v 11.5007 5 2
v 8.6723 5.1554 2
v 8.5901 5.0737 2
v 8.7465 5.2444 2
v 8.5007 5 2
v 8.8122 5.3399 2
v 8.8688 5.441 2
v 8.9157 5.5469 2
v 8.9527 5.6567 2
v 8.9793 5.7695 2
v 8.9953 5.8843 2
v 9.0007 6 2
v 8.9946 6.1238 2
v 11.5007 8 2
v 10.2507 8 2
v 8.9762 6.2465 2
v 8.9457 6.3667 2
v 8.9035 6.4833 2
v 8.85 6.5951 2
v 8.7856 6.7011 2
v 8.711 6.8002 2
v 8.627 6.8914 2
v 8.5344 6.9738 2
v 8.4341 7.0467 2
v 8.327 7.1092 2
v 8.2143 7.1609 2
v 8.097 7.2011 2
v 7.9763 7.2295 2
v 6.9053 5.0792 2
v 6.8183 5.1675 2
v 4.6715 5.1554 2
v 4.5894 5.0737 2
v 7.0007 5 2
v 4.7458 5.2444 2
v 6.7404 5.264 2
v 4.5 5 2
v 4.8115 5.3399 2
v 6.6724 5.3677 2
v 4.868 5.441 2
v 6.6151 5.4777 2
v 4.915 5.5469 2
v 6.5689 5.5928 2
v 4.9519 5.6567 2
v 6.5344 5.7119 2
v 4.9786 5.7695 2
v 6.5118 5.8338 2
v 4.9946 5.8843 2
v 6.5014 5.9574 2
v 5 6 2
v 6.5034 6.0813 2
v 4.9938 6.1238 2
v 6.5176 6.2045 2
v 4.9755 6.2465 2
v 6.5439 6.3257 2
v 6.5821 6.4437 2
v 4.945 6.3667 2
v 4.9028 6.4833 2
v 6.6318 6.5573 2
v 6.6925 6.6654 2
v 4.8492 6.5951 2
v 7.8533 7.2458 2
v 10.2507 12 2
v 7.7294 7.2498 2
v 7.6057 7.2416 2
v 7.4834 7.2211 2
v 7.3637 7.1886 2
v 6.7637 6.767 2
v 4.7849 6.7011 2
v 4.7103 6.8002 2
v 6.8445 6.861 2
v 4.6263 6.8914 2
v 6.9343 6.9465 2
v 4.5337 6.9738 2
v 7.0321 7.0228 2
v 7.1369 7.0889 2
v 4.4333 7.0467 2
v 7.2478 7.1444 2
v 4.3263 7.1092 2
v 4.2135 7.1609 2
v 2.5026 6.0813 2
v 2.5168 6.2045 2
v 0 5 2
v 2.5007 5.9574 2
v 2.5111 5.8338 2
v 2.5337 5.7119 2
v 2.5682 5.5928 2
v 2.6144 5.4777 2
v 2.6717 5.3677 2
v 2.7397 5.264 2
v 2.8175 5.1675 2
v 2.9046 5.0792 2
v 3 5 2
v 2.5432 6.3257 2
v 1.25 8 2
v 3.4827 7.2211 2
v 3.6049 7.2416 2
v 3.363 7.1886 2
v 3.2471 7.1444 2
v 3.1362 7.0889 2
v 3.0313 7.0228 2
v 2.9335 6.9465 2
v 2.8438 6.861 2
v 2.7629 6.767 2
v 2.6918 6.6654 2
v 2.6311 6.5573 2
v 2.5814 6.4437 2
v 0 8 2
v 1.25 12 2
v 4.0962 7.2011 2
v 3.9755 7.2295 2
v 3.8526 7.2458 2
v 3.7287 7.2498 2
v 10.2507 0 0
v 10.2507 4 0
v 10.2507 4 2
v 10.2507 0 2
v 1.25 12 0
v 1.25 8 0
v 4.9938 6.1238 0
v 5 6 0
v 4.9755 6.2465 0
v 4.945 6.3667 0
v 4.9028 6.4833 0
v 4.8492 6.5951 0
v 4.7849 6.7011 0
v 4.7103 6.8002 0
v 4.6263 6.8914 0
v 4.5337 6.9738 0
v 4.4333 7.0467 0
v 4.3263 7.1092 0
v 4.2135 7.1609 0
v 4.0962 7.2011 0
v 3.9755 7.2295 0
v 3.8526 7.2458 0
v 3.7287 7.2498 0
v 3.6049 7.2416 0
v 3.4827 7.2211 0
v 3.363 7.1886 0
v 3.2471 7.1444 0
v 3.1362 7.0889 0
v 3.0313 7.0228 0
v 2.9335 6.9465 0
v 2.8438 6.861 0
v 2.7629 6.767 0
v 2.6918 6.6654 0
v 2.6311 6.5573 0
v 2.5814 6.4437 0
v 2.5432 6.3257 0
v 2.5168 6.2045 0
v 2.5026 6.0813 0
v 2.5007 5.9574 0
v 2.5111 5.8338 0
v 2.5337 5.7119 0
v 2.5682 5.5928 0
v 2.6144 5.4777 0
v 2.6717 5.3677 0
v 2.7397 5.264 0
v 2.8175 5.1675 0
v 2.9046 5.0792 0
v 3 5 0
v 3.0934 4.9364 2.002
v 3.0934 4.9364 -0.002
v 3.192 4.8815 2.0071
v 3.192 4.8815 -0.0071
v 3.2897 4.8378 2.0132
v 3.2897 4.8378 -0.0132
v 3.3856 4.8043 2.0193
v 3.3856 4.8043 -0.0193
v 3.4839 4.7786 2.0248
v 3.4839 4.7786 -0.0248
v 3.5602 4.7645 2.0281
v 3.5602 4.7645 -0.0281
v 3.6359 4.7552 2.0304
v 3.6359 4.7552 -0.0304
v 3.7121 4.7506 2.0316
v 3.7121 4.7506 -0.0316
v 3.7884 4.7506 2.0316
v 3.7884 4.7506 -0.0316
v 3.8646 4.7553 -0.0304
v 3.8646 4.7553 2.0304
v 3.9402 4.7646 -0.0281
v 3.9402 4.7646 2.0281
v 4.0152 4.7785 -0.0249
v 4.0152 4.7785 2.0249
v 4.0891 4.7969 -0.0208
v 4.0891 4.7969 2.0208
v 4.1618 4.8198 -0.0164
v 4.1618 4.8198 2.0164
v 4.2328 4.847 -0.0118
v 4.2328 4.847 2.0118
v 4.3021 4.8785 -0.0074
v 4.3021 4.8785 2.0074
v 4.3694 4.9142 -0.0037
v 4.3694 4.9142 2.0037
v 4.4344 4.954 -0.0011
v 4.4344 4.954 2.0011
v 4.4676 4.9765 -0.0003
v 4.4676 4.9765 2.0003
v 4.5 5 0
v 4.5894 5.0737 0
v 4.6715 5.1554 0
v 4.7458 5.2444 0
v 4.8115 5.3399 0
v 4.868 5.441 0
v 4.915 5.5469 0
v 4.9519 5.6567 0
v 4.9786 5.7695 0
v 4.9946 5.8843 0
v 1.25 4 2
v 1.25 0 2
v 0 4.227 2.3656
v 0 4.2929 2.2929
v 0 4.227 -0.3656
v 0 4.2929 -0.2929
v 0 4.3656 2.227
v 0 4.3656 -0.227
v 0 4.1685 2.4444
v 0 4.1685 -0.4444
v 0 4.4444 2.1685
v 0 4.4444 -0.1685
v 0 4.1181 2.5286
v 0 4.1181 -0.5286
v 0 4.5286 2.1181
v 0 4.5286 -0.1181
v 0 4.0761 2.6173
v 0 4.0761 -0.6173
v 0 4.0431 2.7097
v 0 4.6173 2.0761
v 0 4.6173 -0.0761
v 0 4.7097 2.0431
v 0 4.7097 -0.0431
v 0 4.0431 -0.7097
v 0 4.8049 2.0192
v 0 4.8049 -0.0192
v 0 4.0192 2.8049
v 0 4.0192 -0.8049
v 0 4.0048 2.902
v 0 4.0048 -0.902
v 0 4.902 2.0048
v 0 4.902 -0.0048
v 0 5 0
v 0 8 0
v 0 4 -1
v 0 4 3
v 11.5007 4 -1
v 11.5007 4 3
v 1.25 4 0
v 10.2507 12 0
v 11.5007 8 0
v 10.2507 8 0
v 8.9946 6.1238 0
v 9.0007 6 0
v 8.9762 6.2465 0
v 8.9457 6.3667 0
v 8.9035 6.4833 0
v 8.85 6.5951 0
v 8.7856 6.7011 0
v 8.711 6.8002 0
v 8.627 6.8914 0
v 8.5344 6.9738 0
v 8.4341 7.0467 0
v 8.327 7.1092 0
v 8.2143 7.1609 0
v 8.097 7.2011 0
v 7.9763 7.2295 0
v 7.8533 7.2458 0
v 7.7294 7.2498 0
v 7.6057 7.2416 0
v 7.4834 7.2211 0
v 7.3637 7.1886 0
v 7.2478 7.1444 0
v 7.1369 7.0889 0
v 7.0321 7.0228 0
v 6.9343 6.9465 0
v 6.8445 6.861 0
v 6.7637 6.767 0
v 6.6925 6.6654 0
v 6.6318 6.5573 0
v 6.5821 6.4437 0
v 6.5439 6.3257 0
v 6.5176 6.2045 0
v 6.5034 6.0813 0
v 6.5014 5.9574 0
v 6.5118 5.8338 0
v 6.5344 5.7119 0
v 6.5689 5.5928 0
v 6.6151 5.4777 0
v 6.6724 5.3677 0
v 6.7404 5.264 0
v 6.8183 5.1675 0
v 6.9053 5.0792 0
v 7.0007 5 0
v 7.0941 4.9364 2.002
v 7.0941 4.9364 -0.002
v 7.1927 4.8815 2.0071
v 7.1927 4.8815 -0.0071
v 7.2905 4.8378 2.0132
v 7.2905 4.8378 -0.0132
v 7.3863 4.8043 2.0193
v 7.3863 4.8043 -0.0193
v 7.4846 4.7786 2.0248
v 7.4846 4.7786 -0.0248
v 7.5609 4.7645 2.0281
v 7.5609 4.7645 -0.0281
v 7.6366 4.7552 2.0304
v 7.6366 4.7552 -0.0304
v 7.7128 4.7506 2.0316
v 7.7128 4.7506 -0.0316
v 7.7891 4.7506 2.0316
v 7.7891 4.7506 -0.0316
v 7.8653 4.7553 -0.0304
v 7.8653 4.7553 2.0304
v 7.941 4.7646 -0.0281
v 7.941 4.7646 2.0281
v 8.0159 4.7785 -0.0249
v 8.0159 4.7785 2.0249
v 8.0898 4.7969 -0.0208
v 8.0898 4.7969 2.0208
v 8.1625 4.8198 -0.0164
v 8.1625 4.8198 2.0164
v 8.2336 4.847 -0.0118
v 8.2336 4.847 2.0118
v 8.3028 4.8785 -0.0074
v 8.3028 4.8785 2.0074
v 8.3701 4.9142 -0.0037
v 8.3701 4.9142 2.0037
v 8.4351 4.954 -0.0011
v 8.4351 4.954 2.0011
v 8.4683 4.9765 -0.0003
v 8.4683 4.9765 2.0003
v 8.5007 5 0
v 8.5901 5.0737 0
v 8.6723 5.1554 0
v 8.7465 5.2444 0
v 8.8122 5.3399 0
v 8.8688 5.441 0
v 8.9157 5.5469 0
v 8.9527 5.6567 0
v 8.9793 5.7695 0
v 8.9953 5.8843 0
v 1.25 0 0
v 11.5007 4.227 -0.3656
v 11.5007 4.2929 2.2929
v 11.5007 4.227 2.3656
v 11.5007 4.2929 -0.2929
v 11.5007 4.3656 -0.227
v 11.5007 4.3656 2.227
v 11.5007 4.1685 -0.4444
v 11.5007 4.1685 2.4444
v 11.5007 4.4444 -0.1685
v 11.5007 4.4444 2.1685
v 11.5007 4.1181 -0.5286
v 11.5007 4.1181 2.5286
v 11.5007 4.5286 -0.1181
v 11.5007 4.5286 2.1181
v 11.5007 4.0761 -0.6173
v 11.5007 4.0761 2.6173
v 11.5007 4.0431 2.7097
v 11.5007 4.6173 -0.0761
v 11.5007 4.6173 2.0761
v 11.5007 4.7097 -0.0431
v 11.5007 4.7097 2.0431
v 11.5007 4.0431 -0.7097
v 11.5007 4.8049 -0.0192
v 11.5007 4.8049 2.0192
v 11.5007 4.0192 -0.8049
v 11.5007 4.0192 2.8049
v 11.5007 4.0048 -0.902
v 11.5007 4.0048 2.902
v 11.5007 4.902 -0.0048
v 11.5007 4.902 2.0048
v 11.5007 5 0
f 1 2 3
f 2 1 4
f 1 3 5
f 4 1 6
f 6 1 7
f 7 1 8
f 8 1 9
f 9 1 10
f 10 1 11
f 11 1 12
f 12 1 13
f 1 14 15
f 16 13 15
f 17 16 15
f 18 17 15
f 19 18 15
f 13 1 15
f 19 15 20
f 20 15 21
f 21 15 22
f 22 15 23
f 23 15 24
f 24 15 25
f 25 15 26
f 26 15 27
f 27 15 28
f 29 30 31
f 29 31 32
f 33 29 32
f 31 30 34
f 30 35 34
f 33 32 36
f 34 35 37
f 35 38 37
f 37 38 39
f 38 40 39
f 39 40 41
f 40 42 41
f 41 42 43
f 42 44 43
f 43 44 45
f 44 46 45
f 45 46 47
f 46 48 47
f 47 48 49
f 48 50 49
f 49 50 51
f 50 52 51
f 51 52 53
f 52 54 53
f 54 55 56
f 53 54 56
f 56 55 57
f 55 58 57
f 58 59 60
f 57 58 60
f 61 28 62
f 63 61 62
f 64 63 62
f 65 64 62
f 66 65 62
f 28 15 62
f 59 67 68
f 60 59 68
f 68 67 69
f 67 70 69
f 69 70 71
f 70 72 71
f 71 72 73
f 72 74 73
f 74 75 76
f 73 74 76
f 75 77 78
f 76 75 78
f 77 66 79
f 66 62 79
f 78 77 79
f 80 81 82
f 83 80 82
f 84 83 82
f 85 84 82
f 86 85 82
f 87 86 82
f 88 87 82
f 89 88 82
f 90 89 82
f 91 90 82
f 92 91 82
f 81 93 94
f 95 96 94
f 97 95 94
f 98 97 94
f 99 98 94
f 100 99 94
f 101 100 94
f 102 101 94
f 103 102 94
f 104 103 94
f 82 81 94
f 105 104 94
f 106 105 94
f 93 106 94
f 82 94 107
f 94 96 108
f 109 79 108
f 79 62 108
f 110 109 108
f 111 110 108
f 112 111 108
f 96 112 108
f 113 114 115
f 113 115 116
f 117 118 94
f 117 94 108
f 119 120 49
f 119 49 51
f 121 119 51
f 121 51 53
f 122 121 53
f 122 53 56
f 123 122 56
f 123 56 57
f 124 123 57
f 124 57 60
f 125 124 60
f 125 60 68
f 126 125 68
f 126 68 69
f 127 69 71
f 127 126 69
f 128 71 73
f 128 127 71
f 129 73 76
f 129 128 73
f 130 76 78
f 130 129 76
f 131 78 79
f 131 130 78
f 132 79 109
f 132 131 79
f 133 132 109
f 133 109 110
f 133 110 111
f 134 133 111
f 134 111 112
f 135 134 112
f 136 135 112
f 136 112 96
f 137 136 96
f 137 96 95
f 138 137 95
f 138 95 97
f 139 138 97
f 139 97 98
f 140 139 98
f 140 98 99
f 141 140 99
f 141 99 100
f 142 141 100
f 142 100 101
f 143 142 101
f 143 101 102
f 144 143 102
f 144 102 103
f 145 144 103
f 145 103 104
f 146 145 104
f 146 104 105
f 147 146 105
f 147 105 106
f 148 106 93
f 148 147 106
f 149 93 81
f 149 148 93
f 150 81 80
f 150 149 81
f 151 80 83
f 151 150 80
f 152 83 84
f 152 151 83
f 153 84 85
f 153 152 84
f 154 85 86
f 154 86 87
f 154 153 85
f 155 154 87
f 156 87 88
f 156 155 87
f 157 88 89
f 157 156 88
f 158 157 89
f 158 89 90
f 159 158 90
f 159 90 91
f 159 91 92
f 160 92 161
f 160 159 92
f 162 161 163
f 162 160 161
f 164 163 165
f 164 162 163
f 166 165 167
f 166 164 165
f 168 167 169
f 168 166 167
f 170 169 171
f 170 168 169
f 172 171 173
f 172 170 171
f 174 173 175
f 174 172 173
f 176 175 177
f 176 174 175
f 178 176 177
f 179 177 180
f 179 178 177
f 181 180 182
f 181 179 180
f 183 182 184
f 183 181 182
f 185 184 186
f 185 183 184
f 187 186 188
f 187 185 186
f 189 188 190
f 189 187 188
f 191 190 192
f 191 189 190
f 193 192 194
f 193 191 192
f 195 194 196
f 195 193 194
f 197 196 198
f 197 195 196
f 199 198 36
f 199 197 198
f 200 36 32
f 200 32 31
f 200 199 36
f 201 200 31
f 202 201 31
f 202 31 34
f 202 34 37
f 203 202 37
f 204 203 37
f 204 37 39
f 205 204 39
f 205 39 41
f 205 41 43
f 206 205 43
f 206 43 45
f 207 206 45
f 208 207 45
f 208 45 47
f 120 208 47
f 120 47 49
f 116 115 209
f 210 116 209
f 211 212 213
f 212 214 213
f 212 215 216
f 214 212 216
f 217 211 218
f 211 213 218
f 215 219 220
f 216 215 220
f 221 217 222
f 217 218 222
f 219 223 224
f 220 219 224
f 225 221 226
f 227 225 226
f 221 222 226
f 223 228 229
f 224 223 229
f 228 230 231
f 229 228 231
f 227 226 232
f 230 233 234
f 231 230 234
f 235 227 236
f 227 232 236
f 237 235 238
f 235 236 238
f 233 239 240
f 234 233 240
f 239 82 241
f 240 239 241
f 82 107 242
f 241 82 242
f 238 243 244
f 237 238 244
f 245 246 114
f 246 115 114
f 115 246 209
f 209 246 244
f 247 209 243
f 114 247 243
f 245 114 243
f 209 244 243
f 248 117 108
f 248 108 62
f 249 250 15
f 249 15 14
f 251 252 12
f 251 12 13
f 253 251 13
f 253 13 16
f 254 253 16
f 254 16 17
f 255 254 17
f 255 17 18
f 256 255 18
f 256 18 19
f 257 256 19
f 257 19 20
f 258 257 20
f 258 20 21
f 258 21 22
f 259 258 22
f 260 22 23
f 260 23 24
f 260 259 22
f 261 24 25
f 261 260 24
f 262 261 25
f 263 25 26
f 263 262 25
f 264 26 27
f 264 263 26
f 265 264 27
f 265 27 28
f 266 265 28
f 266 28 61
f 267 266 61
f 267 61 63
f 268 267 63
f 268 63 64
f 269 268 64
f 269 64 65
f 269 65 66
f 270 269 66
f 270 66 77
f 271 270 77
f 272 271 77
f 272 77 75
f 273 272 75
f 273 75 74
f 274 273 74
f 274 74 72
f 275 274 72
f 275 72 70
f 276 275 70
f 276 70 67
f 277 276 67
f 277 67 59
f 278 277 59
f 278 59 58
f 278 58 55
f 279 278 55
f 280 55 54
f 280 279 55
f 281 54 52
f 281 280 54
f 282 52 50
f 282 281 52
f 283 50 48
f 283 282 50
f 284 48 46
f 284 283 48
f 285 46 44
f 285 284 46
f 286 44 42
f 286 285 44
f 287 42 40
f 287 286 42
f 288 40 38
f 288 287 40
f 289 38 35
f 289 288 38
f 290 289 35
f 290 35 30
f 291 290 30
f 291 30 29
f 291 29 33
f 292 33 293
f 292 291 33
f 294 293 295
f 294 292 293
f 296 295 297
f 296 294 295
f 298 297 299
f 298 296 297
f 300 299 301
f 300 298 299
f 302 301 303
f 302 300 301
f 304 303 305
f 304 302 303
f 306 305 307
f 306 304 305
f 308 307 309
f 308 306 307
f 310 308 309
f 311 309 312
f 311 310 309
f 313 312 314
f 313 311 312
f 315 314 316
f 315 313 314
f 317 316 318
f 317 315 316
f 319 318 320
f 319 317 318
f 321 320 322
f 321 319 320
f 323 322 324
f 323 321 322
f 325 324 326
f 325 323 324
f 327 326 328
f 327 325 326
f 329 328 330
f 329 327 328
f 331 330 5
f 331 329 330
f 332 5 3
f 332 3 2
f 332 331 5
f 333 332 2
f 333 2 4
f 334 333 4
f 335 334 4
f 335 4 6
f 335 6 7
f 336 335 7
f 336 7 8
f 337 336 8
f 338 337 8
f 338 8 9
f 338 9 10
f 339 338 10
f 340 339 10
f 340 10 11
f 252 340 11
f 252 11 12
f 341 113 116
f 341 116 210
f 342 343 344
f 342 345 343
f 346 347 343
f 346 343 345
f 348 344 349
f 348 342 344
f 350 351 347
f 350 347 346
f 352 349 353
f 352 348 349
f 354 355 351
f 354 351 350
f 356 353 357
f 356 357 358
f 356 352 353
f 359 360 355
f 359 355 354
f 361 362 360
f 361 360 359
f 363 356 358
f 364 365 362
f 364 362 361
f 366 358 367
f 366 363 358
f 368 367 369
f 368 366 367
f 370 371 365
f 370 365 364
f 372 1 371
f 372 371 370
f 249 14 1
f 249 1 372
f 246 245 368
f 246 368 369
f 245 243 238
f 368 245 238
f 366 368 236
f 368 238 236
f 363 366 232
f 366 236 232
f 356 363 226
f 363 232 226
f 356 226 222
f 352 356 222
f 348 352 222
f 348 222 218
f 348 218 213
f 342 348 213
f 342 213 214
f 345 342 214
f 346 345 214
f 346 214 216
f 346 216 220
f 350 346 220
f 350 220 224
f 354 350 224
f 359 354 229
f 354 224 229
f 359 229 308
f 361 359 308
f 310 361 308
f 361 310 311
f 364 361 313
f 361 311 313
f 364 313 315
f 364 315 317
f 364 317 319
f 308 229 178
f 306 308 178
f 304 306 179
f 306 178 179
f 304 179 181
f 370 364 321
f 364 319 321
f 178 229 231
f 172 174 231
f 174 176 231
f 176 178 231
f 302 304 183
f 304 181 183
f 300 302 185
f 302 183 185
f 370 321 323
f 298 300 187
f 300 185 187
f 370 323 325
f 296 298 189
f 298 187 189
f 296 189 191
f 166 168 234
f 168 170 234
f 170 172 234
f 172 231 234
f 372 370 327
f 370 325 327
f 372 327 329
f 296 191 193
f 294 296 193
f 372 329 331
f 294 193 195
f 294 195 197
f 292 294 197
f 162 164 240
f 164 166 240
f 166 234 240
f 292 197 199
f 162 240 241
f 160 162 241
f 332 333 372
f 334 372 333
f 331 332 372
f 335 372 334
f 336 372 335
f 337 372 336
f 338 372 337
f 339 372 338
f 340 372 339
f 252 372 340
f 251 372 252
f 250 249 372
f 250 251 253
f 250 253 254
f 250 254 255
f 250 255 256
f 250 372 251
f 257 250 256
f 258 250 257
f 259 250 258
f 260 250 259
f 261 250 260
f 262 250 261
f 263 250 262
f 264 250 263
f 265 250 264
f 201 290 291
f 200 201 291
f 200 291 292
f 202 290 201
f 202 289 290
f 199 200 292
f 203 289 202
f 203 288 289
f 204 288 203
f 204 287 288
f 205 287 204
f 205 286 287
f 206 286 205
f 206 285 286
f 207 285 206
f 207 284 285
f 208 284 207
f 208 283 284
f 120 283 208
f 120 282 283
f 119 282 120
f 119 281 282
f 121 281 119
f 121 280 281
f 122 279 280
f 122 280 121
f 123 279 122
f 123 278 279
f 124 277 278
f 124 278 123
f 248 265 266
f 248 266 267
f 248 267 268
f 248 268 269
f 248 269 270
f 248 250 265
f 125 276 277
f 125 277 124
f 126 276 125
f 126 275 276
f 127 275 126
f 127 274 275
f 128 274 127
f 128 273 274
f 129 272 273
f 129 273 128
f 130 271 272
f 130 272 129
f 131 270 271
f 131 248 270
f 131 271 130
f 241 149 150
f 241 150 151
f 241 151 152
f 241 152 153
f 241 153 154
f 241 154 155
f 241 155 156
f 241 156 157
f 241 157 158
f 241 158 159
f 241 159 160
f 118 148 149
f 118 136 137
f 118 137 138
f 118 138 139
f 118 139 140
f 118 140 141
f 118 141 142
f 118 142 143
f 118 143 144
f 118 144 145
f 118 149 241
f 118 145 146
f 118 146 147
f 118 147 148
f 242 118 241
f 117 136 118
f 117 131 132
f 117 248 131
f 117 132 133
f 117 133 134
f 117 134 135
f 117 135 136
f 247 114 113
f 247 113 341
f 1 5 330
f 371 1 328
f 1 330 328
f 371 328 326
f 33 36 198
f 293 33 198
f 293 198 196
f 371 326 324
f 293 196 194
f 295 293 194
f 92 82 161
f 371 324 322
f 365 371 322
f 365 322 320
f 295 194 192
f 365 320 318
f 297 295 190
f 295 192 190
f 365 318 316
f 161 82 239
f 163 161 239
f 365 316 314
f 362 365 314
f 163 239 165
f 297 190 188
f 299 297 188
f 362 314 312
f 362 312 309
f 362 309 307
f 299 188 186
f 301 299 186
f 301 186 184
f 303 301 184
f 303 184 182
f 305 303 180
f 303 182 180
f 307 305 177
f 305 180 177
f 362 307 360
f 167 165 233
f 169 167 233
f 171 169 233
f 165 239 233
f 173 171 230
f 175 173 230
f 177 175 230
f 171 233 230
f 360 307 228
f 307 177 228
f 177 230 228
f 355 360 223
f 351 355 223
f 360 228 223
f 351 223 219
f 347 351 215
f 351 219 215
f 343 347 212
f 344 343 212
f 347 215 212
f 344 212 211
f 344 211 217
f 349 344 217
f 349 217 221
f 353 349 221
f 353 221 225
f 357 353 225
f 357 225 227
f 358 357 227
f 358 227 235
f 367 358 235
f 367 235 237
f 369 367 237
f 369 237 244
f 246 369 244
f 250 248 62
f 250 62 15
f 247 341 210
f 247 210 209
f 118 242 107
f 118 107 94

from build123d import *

# Parameters (mm, degrees)
MODEL_R                 = 1.25
BOSS_EXTRUDE1_DEPTH     = 2
BOSS_EXTRUDE2_DEPTH     = 11.50072
SKETCH2_R               = 1.25
CUT_EXTRUDE1_DEPTH      = 2
CUT_EXTRUDE1_DEPTH_BACK = 4


with BuildPart() as part:
    # Model → Boss-Extrude1 (new body)
    with BuildSketch(Plane.XY):
        Polygon((1.25, 4), (0, 4), (0, 8), (1.25, 8), (1.25, 12), (10.25072, 12), (10.25072, 8), (11.50072, 8), (11.50072, 4), (10.25072, 4), (10.25072, 0), (1.25, 0), align=None)
        with Locations((7.75072, 6)):
            Circle(MODEL_R, mode=Mode.SUBTRACT)
        with Locations((3.75, 6)):
            Circle(MODEL_R, mode=Mode.SUBTRACT)
    extrude(amount=BOSS_EXTRUDE1_DEPTH)

    # Sketch1 → Boss-Extrude2 (add)
    with BuildSketch(Plane.ZY):
        with BuildLine():
            Line((2, 4), (2, 5))
            ThreePointArc((2, 5), (2.292893219, 4.292893219), (3, 4))
            Line((3, 4), (2, 4))
        make_face()
        with BuildLine():
            Line((0, 4), (-1, 4))
            ThreePointArc((-1, 4), (-0.292893219, 4.292893219), (0, 5))
            Line((0, 5), (0, 4))
        make_face()
    extrude(amount=-BOSS_EXTRUDE2_DEPTH)

    # Sketch2 → Cut-Extrude1 (cut, two sides)
    with BuildSketch(Plane.XY.offset(2)) as cut_extrude1_sk:
        with Locations((3.75, 6)):
            Circle(SKETCH2_R)
        with Locations((7.75072, 6)):
            Circle(SKETCH2_R)
    extrude(amount=CUT_EXTRUDE1_DEPTH, mode=Mode.SUBTRACT)
    extrude(cut_extrude1_sk.sketch, amount=-CUT_EXTRUDE1_DEPTH_BACK, mode=Mode.SUBTRACT)


solid = part.part
